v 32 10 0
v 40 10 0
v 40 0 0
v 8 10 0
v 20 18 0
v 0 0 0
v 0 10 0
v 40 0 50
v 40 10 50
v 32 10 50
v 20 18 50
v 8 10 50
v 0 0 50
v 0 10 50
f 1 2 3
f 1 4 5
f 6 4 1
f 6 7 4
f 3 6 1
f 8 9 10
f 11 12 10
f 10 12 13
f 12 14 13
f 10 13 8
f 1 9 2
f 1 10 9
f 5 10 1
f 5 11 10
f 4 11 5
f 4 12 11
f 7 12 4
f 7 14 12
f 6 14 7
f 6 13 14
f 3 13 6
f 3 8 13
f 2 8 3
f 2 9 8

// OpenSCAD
$fn = 32;

// ----------------------------------------------------------------------
// V guide rail: vrib, 40 mm wide
// ----------------------------------------------------------------------

// --- parameters (mm) ---
rail_w = 40;              // rail width, X
base_t = 10;              // base plate thickness
v_depth = 8;              // V feature depth / height
v_half_w = 12;            // half width of the V at the base face
plate_t = 50;             // rail length, Z (the extrusion height)

profile = [[0, 0], [40, 0], [40, 10], [32, 10], [20, 18], [8, 10], [0, 10]];  // primary outline, 7 points, counter clockwise

// --- the one profile operation ---
linear_extrude(height = plate_t) polygon(points = profile);
